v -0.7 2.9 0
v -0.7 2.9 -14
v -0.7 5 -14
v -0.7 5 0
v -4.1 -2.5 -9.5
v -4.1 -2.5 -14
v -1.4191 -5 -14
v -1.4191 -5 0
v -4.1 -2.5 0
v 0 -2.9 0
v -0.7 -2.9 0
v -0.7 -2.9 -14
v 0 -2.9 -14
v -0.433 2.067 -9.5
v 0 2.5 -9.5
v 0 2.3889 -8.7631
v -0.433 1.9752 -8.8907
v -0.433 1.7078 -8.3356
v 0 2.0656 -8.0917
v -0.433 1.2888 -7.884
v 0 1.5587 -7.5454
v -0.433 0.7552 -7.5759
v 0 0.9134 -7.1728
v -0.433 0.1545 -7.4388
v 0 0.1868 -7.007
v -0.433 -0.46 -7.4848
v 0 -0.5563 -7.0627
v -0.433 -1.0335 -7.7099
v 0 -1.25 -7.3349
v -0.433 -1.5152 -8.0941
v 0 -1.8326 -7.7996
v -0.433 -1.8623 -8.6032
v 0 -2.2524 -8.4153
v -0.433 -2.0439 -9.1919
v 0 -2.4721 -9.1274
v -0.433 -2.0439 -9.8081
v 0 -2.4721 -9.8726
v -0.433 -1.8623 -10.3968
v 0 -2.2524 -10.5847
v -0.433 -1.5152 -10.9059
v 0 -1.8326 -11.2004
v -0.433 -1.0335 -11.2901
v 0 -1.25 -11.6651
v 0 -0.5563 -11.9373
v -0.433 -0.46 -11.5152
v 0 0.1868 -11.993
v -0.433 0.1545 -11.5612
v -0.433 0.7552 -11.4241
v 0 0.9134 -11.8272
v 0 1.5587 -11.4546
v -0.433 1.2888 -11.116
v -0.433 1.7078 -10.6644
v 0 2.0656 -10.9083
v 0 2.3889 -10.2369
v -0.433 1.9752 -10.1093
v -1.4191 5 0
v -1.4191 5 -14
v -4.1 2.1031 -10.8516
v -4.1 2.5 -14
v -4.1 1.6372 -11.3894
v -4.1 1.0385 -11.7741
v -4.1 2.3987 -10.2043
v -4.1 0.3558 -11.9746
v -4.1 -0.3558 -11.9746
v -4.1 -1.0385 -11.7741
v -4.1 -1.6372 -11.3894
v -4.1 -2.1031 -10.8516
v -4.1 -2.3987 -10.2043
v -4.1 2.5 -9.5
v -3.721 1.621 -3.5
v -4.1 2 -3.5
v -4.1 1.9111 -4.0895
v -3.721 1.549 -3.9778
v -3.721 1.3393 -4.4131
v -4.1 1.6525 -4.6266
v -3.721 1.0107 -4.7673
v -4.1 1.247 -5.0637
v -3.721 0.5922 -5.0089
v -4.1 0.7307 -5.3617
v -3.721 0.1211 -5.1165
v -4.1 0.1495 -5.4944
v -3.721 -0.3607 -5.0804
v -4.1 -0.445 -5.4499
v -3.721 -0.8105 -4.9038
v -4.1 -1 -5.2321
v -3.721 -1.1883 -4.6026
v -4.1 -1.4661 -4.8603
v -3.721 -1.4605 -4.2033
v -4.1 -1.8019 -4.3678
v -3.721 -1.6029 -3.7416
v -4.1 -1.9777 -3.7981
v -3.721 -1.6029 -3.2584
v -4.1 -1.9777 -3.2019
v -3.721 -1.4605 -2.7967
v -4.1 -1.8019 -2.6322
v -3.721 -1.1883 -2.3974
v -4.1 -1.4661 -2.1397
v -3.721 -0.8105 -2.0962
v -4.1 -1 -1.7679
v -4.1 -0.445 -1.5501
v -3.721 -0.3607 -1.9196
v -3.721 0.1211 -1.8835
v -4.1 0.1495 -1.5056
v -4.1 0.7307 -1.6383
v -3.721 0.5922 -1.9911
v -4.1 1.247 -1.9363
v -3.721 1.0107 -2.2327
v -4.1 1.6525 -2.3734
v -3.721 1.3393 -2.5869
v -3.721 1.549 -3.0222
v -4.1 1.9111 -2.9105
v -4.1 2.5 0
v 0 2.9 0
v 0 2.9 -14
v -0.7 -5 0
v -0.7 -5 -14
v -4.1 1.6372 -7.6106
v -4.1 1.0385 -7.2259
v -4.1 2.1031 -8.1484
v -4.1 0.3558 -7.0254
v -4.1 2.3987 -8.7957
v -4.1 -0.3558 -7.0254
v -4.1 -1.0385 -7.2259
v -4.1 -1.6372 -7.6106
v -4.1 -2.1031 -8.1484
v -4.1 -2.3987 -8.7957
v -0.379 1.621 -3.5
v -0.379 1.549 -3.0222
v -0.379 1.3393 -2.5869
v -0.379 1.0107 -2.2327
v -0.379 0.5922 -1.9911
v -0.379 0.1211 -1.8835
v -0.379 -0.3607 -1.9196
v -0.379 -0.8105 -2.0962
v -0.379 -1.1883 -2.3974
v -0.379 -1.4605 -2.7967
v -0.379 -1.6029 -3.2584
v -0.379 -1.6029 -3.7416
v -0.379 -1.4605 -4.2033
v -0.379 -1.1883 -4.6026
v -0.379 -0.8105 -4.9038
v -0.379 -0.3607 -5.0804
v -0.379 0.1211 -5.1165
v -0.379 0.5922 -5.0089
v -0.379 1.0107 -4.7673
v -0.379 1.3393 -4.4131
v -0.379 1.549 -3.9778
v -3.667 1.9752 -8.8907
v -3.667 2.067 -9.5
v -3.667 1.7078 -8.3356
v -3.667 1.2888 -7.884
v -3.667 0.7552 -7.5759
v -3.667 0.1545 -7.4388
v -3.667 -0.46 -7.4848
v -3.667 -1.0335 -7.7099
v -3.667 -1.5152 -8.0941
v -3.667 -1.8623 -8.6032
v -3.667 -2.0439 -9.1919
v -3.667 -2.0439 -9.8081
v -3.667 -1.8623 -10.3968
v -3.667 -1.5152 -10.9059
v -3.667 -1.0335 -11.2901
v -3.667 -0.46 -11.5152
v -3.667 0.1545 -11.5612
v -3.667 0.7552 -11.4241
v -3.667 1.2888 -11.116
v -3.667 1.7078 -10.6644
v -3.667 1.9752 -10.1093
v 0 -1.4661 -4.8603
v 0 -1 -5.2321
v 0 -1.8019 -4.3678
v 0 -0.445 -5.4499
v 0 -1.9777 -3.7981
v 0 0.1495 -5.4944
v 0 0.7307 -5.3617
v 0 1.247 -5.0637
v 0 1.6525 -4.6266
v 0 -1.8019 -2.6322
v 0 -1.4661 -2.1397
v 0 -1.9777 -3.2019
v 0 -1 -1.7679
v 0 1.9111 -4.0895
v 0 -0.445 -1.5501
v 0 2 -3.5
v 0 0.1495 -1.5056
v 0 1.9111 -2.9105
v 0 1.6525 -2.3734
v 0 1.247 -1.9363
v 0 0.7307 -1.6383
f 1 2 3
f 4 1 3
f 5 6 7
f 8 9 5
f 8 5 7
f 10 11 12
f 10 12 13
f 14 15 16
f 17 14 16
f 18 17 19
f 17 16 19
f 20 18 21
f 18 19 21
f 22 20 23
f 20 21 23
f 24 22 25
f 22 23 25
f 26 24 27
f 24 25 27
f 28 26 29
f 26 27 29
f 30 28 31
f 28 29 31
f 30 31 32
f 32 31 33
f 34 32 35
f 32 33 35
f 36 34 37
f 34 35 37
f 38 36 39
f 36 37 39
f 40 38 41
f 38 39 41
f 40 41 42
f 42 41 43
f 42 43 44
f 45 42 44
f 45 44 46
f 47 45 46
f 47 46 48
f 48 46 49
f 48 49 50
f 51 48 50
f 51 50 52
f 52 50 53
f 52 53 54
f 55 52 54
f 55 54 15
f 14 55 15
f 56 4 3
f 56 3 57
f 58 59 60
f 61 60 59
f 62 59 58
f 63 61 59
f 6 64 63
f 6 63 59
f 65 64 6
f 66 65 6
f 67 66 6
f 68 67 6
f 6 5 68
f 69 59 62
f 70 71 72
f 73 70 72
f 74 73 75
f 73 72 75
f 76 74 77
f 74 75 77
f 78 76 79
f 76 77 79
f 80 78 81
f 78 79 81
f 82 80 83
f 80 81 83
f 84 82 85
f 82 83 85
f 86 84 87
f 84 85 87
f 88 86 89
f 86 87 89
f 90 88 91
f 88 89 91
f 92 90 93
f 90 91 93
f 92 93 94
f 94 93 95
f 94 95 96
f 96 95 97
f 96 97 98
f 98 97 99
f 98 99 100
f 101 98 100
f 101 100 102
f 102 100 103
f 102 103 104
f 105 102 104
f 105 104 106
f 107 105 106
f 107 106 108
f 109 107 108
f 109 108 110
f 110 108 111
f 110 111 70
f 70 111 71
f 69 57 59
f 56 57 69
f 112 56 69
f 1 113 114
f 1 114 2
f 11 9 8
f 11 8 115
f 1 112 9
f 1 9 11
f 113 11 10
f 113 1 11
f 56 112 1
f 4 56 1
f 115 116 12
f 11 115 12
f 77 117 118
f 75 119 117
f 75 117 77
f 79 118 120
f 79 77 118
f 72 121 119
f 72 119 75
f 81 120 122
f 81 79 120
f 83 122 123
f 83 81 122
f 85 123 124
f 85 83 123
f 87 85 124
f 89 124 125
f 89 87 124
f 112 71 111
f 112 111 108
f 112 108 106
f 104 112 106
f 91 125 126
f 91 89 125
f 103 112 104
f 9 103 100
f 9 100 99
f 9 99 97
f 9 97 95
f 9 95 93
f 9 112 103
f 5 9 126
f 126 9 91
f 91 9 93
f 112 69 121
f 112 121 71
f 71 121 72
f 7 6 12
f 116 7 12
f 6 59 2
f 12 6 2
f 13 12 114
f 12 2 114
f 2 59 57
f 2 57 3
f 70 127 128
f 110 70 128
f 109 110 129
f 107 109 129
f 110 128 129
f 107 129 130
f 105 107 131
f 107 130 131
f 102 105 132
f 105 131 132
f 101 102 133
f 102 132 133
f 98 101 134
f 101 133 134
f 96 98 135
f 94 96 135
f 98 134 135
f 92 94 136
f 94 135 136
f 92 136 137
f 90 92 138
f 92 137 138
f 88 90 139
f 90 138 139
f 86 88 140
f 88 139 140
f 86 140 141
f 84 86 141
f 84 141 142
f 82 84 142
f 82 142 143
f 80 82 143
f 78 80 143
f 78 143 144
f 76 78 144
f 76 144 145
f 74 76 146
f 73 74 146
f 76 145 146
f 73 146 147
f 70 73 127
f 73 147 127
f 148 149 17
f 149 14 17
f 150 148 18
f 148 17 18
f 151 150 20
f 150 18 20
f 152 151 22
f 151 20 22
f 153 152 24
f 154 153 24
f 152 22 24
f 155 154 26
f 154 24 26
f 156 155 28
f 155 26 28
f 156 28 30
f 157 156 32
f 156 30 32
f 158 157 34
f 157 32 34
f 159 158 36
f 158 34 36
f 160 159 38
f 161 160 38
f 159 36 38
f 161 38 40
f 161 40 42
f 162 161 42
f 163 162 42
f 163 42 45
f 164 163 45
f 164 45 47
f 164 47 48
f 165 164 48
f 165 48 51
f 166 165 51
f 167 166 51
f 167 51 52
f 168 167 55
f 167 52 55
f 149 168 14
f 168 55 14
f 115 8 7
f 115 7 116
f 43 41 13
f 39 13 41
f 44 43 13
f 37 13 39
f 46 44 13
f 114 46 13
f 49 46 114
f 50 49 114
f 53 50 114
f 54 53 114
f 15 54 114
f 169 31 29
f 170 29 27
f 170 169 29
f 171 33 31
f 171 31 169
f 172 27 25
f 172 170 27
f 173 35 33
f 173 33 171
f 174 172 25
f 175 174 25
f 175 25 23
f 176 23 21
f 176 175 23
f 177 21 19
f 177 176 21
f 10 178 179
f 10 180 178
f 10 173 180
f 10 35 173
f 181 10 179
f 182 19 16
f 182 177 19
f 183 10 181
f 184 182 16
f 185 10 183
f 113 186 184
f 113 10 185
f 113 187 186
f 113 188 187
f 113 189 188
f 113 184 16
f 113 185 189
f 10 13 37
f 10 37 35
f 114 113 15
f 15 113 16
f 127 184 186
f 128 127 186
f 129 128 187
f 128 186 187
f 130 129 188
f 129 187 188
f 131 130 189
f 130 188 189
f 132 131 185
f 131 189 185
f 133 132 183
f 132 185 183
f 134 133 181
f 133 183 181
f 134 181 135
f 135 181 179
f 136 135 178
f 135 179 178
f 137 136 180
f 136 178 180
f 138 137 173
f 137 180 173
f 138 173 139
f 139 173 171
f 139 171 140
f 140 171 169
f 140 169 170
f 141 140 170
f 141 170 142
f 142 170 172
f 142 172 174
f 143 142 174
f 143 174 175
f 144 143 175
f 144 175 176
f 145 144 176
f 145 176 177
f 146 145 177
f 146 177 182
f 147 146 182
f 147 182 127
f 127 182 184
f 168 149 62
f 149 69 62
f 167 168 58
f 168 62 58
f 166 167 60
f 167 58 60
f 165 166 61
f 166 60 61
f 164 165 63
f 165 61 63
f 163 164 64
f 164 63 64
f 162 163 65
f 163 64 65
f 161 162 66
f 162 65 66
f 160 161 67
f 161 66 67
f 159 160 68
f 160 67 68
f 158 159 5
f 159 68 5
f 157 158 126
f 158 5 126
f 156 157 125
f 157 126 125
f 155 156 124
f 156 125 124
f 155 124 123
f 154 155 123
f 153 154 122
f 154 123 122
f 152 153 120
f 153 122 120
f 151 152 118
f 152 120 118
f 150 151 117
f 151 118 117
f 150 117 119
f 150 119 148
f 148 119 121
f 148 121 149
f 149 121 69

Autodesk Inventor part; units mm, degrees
sketch "Sketch_1" plane through (0, 0, 0) normal (0, 0, 1) x (1, 0, 0)
  line L0 (-4.1, -2.5) -> (-1.4191, -5)
  line L1 (-1.4191, -5) -> (-0.7, -5)
  line L2 (-0.7, -5) -> (-0.7, -2.9)
  line L3 (-0.7, -2.9) -> (0, -2.9)
  line L4 (0, -2.9) -> (0, 2.9)
  line L5 (0, 2.9) -> (-0.7, 2.9)
  line L6 (-0.7, 2.9) -> (-0.7, 5)
  line L7 (-0.7, 5) -> (-1.4191, 5)
  line L8 (-1.4191, 5) -> (-4.1, 2.5)
  line L9 (-4.1, 2.5) -> (-4.1, -2.5)
extrude "Extrusion1" add sketch "Sketch_1" against normal blind 14
sketch "Sketch_2" plane through (0, 0, -3.5) normal (0, 0, 1) x (1, 0, 0)
  line L0 (0, 0) -> (-4.1, 0)
  line L1 (-4.1, 0) -> (-4.1, 2)
  line L2 (-4.1, 2) -> (-3.721, 1.621)
  line L3 (-3.721, 1.621) -> (-0.379, 1.621)
  line L4 (-0.379, 1.621) -> (0, 2)
  line L5 (0, 2) -> (0, 0)
  line L6 (0, 0) -> (-4.1, 0)
revolve "Revolution1" cut sketch "Sketch_2" angle 360 about axis through (0, 0, -3.5) along (1, 0, 0)
thread "Thread1" size "M4x0.7" class "6H" standard "ISO Metric profile" full length
sketch "Sketch_3" plane through (0, 0, -9.5) normal (0, 0, 1) x (1, 0, 0)
  line L0 (0, 0) -> (-4.1, 0)
  line L1 (-4.1, 0) -> (-4.1, 2.5)
  line L2 (-4.1, 2.5) -> (-3.667, 2.067)
  line L3 (-3.667, 2.067) -> (-0.433, 2.067)
  line L4 (-0.433, 2.067) -> (0, 2.5)
  line L5 (0, 2.5) -> (0, 0)
  line L6 (0, 0) -> (-4.1, 0)
revolve "Revolution2" cut sketch "Sketch_3" angle 360 about axis through (0, 0, -9.5) along (1, 0, 0)
thread "Thread2" size "M5x0.8" class "6H" standard "ISO Metric profile" full length
ref_plane "bolt_XY" through (-4.1, 0, -9.5) normal (1, 0, 0) x (0, 0, -1)
ref_plane "bolt_YZ" through (-4.1, 0, -9.5) normal (0, 0, -1) x (0, 1, 0)
ref_plane "bolt_ZX" through (-4.1, 0, -9.5) normal (0, 1, 0) x (1, 0, 0)
ref_plane "frame_XY" through (-0.7, 0, -9.5) normal (1, 0, 0) x (0, 0, -1)
ref_plane "frame_YZ" through (-0.7, 0, -9.5) normal (0, 0, -1) x (0, 1, 0)
ref_plane "frame_ZX" through (-0.7, 0, -9.5) normal (0, 1, 0) x (1, 0, 0)
ref_plane "nut_XY" through (0, 0, -9.5) normal (1, 0, 0) x (0, 0, -1)
ref_plane "nut_YZ" through (0, 0, -9.5) normal (0, 0, -1) x (0, 1, 0)
ref_plane "nut_ZX" through (0, 0, -9.5) normal (0, 1, 0) x (1, 0, 0)
ref_plane "set_screw_XY" through (-4.1, 0, -3.5) normal (1, 0, 0) x (0, 0, -1)
ref_plane "set_screw_YZ" through (-4.1, 0, -3.5) normal (0, 0, -1) x (0, 1, 0)
ref_plane "set_screw_ZX" through (-4.1, 0, -3.5) normal (0, 1, 0) x (1, 0, 0)
properties part number "HNTC5_n" material "鋼、炭素鋼"
